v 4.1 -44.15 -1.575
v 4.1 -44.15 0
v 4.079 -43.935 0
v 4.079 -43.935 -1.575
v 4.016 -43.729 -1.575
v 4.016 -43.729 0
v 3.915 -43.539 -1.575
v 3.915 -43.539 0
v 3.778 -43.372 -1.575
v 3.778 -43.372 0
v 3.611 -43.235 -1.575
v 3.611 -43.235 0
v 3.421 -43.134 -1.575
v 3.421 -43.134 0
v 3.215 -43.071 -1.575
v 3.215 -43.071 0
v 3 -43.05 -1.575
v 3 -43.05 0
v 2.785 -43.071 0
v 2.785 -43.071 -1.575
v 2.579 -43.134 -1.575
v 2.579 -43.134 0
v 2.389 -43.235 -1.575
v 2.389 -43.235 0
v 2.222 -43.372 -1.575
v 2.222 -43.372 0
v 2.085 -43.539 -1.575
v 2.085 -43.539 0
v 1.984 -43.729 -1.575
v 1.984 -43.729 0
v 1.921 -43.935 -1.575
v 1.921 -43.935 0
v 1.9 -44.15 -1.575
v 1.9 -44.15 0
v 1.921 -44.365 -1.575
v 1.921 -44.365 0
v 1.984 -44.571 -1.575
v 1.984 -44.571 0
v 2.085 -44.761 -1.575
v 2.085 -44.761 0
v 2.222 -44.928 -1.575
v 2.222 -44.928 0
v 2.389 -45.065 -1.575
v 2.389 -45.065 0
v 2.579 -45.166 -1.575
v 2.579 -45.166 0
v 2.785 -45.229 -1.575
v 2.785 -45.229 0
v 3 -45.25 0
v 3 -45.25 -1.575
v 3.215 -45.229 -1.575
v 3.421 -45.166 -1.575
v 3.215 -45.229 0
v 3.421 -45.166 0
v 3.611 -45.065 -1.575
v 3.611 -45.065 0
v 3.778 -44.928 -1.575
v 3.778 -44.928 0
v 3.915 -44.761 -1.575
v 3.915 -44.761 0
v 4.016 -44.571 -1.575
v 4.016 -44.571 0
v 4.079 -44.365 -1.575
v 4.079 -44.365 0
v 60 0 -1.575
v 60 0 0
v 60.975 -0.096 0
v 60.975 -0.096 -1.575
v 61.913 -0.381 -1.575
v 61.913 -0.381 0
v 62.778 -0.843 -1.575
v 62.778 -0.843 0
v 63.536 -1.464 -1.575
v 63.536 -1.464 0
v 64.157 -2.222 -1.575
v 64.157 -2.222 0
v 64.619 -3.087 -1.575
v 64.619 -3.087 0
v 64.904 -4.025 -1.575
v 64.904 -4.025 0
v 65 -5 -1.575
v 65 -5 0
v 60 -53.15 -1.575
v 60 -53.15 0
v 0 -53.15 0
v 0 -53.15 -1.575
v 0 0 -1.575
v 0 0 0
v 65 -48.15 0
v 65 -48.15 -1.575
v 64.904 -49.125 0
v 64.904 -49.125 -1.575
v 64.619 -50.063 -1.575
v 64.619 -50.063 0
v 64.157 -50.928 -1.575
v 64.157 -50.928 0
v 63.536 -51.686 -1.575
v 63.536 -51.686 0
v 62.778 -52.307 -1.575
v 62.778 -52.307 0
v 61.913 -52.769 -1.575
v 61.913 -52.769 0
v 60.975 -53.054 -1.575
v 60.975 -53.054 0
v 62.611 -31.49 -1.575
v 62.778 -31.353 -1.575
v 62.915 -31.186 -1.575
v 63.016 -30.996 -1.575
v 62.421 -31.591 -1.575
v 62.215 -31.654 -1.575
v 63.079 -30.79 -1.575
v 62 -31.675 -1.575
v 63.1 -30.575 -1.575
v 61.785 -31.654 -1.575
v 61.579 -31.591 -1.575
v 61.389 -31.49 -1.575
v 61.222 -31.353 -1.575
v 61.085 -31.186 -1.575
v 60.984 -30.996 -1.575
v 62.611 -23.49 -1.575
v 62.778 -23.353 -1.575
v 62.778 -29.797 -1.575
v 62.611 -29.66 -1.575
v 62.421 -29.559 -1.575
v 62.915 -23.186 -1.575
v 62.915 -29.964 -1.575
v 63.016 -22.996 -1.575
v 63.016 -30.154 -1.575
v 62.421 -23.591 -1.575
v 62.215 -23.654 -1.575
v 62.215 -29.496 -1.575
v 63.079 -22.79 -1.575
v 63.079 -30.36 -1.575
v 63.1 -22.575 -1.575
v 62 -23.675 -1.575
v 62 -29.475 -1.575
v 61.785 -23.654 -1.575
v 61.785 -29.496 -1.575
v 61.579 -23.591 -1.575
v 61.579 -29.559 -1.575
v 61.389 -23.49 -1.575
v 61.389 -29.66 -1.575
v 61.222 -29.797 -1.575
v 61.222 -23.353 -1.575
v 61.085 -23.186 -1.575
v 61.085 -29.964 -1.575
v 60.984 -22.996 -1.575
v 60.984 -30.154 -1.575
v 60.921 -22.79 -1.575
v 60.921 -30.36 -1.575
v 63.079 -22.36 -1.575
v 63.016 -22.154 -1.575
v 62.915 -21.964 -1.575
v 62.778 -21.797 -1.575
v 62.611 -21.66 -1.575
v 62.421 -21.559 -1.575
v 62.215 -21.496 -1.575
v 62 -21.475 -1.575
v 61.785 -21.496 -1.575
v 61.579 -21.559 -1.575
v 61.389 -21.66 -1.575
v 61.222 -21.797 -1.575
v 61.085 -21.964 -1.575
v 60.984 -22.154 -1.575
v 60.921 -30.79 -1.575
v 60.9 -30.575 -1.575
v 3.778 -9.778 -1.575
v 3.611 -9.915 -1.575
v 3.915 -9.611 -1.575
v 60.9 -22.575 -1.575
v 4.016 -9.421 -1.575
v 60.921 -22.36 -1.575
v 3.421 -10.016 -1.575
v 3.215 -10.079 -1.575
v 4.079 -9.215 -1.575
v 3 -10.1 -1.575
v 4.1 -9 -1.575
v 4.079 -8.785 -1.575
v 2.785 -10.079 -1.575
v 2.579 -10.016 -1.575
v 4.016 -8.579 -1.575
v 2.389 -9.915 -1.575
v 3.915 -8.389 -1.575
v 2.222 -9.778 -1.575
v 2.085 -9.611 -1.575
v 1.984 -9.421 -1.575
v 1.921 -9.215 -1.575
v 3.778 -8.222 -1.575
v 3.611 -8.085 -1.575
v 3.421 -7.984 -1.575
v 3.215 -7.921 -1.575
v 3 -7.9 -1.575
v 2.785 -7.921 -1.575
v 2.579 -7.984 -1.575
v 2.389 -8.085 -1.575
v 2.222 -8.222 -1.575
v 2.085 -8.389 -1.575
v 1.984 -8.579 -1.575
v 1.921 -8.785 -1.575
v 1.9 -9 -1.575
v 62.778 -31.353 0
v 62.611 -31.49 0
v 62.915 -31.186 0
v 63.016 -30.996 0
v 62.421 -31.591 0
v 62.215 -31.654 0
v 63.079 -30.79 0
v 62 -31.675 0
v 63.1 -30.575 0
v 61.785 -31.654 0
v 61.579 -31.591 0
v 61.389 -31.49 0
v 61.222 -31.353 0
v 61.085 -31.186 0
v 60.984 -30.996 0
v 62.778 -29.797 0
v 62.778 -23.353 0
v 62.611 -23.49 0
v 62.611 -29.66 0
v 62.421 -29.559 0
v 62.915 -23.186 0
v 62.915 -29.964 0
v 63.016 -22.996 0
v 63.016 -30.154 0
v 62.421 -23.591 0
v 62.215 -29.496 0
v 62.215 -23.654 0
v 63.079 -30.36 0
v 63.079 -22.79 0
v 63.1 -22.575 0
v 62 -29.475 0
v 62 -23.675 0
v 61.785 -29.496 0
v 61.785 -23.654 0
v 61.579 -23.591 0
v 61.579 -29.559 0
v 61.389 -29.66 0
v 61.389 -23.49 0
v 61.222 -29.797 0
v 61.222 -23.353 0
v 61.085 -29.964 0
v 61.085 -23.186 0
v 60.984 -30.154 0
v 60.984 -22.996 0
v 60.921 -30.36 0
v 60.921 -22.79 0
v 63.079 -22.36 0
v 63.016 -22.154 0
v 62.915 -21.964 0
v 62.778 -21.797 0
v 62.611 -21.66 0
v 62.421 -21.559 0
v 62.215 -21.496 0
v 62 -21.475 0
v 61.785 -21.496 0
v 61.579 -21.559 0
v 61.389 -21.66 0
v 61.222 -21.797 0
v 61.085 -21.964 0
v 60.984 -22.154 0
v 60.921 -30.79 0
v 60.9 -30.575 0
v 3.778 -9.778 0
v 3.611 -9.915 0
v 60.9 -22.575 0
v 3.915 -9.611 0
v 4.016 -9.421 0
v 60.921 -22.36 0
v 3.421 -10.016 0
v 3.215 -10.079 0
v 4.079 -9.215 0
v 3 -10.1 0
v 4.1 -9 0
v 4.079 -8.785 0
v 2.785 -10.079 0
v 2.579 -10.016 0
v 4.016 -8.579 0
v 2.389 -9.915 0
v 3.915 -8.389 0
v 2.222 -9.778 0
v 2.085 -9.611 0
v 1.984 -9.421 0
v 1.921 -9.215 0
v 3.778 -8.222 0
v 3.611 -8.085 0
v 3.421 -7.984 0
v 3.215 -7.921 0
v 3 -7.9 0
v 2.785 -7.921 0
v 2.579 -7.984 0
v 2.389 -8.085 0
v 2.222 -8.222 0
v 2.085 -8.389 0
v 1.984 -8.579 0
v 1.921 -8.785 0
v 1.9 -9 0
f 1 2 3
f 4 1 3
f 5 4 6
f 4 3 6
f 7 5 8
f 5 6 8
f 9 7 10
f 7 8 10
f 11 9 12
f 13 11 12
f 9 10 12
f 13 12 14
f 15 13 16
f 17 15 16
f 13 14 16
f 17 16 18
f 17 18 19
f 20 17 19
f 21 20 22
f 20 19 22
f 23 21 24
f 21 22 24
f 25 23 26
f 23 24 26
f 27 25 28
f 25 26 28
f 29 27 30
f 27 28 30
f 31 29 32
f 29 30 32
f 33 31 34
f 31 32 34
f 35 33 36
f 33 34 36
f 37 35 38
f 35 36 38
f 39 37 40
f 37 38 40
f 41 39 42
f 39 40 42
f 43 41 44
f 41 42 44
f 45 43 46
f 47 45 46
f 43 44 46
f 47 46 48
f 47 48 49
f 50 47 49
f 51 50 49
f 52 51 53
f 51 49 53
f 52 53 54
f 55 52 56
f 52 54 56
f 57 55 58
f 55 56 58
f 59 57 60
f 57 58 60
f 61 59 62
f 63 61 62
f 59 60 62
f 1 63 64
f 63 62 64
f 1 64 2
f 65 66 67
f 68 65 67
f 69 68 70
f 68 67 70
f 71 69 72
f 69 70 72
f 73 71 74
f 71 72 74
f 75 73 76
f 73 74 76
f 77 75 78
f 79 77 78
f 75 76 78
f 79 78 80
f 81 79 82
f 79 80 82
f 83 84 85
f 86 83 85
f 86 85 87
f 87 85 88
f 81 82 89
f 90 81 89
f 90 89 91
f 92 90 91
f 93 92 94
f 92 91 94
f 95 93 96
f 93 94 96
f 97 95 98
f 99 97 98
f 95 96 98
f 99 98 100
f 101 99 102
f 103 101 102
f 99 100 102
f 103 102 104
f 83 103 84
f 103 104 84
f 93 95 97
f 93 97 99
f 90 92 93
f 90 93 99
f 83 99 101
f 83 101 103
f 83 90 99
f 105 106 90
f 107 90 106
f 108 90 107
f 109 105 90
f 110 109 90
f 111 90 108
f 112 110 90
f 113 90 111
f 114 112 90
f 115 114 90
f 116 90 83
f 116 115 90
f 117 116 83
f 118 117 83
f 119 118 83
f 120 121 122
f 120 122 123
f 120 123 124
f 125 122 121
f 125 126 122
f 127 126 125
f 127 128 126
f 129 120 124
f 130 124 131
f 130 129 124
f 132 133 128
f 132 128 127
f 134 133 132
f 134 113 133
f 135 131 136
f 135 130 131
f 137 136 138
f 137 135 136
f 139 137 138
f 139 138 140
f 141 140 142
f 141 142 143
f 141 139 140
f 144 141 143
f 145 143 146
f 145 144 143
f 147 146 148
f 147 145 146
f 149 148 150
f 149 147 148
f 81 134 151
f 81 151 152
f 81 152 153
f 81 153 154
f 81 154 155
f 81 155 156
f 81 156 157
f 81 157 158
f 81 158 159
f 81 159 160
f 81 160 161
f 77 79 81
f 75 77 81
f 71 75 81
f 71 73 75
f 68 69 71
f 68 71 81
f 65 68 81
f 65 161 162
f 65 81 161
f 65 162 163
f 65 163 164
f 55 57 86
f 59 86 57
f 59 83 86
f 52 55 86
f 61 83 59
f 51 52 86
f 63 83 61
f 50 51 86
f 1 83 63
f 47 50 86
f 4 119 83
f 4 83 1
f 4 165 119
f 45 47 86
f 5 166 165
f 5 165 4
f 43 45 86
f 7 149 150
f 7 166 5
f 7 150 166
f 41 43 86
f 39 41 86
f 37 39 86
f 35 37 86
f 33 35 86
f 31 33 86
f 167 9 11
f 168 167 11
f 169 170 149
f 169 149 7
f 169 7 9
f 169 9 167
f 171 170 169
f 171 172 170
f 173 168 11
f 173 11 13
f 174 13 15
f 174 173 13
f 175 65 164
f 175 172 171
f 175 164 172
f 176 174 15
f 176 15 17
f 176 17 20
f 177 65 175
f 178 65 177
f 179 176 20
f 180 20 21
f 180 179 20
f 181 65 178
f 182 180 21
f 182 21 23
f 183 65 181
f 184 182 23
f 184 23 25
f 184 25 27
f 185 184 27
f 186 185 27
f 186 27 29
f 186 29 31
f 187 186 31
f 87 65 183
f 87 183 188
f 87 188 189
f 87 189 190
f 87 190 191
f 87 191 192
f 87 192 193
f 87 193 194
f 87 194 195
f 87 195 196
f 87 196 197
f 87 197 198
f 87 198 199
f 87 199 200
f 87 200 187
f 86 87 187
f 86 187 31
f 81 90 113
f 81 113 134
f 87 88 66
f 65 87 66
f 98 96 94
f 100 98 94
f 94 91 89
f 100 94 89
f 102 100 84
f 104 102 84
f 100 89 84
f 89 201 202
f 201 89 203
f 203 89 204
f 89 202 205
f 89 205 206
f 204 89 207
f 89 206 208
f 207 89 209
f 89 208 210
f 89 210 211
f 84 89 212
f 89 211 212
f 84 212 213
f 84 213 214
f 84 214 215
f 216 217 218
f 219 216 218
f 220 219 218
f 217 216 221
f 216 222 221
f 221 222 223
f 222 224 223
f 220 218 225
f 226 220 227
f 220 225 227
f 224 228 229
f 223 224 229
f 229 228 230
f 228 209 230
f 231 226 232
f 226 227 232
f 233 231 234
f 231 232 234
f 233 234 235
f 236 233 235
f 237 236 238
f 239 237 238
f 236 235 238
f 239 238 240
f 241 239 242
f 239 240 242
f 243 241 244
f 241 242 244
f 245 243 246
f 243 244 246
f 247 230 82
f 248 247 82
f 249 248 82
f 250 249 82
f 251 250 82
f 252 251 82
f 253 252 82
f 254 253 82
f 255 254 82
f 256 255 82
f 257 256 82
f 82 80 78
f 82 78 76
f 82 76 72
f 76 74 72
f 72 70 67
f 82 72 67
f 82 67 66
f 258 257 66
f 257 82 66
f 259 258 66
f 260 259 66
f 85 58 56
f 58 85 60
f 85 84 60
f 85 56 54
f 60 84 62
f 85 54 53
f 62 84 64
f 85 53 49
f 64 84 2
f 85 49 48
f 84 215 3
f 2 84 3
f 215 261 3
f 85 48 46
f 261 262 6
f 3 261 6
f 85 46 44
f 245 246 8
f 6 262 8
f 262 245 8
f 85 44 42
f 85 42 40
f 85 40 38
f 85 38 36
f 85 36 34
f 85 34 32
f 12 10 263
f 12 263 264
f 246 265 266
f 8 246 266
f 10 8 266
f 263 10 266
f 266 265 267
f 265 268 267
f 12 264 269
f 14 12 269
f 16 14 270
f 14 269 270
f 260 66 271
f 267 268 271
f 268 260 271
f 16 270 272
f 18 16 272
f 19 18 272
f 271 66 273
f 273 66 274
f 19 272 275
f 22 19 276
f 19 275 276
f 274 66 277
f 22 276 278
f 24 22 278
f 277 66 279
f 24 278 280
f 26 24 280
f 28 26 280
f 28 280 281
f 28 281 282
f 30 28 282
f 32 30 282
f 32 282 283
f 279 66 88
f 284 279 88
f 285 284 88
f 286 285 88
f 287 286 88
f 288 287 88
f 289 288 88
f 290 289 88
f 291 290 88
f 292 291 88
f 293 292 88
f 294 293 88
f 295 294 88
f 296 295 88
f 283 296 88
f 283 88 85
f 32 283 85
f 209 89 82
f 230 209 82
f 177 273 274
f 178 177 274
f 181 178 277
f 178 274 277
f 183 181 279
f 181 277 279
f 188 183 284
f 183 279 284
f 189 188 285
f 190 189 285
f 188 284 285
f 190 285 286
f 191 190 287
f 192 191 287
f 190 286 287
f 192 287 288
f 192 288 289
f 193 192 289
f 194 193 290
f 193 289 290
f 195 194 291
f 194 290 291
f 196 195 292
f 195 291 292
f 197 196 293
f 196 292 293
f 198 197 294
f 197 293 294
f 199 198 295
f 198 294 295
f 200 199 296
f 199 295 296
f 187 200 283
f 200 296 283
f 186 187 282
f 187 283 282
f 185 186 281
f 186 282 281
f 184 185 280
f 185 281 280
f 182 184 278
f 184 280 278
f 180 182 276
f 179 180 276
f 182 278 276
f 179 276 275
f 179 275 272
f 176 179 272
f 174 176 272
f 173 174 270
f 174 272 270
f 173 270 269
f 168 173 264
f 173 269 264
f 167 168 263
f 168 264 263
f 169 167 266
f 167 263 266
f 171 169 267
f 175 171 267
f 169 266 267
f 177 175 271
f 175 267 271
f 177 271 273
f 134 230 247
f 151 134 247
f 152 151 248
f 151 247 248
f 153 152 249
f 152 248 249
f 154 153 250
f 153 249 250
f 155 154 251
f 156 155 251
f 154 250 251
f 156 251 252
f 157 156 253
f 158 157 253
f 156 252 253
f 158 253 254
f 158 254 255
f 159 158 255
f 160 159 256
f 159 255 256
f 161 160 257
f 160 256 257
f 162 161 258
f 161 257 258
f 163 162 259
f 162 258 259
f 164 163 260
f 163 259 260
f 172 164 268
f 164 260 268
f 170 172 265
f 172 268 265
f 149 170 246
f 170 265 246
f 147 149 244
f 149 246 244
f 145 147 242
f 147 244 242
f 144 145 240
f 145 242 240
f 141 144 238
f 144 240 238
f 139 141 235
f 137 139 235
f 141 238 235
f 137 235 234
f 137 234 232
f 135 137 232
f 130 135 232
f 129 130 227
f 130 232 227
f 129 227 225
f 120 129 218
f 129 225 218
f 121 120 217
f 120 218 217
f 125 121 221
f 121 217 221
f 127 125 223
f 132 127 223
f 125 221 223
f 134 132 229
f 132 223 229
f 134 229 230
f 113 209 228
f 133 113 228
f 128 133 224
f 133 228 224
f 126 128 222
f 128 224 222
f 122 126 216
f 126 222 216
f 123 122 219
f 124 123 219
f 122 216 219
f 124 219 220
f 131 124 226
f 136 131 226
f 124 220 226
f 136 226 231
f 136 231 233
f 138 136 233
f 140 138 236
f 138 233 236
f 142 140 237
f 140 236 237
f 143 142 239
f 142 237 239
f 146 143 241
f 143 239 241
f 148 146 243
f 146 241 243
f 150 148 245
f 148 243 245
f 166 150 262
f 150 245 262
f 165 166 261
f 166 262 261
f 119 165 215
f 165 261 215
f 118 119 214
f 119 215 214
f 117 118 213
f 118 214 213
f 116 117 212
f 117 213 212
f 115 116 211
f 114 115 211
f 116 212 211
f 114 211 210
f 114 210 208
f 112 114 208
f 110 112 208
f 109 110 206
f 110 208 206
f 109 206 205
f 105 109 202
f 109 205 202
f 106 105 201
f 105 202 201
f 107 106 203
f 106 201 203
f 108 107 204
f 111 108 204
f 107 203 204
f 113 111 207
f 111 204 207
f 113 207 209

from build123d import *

# Parameters (mm, degrees)
F_20_MCAT_BPL2_PCB_OUTLINE_R = 1.1
BOSS_EXTRUDE1_DEPTH          = 1.5748


with BuildPart() as part:
    # 20 MCAT BPL2 PCB Outline → Boss-Extrude1 (new body)
    with BuildSketch(Plane.XY):
        with BuildLine():
            Line((0, -53.15), (0, 0))
            Line((0, 0), (60, 0))
            ThreePointArc((60, 0), (63.535533906, -1.464466094), (65, -5))
            Line((65, -5), (65, -48.15))
            ThreePointArc((65, -48.15), (63.535533906, -51.685533906), (60, -53.15))
            Line((60, -53.15), (0, -53.15))
        make_face()
        with Locations((3, -44.15)):
            Circle(F_20_MCAT_BPL2_PCB_OUTLINE_R, mode=Mode.SUBTRACT)
        with Locations((62, -30.575)):
            Circle(F_20_MCAT_BPL2_PCB_OUTLINE_R, mode=Mode.SUBTRACT)
        with Locations((3, -9)):
            Circle(F_20_MCAT_BPL2_PCB_OUTLINE_R, mode=Mode.SUBTRACT)
        with Locations((62, -22.575)):
            Circle(F_20_MCAT_BPL2_PCB_OUTLINE_R, mode=Mode.SUBTRACT)
    extrude(amount=-BOSS_EXTRUDE1_DEPTH)


solid = part.part
